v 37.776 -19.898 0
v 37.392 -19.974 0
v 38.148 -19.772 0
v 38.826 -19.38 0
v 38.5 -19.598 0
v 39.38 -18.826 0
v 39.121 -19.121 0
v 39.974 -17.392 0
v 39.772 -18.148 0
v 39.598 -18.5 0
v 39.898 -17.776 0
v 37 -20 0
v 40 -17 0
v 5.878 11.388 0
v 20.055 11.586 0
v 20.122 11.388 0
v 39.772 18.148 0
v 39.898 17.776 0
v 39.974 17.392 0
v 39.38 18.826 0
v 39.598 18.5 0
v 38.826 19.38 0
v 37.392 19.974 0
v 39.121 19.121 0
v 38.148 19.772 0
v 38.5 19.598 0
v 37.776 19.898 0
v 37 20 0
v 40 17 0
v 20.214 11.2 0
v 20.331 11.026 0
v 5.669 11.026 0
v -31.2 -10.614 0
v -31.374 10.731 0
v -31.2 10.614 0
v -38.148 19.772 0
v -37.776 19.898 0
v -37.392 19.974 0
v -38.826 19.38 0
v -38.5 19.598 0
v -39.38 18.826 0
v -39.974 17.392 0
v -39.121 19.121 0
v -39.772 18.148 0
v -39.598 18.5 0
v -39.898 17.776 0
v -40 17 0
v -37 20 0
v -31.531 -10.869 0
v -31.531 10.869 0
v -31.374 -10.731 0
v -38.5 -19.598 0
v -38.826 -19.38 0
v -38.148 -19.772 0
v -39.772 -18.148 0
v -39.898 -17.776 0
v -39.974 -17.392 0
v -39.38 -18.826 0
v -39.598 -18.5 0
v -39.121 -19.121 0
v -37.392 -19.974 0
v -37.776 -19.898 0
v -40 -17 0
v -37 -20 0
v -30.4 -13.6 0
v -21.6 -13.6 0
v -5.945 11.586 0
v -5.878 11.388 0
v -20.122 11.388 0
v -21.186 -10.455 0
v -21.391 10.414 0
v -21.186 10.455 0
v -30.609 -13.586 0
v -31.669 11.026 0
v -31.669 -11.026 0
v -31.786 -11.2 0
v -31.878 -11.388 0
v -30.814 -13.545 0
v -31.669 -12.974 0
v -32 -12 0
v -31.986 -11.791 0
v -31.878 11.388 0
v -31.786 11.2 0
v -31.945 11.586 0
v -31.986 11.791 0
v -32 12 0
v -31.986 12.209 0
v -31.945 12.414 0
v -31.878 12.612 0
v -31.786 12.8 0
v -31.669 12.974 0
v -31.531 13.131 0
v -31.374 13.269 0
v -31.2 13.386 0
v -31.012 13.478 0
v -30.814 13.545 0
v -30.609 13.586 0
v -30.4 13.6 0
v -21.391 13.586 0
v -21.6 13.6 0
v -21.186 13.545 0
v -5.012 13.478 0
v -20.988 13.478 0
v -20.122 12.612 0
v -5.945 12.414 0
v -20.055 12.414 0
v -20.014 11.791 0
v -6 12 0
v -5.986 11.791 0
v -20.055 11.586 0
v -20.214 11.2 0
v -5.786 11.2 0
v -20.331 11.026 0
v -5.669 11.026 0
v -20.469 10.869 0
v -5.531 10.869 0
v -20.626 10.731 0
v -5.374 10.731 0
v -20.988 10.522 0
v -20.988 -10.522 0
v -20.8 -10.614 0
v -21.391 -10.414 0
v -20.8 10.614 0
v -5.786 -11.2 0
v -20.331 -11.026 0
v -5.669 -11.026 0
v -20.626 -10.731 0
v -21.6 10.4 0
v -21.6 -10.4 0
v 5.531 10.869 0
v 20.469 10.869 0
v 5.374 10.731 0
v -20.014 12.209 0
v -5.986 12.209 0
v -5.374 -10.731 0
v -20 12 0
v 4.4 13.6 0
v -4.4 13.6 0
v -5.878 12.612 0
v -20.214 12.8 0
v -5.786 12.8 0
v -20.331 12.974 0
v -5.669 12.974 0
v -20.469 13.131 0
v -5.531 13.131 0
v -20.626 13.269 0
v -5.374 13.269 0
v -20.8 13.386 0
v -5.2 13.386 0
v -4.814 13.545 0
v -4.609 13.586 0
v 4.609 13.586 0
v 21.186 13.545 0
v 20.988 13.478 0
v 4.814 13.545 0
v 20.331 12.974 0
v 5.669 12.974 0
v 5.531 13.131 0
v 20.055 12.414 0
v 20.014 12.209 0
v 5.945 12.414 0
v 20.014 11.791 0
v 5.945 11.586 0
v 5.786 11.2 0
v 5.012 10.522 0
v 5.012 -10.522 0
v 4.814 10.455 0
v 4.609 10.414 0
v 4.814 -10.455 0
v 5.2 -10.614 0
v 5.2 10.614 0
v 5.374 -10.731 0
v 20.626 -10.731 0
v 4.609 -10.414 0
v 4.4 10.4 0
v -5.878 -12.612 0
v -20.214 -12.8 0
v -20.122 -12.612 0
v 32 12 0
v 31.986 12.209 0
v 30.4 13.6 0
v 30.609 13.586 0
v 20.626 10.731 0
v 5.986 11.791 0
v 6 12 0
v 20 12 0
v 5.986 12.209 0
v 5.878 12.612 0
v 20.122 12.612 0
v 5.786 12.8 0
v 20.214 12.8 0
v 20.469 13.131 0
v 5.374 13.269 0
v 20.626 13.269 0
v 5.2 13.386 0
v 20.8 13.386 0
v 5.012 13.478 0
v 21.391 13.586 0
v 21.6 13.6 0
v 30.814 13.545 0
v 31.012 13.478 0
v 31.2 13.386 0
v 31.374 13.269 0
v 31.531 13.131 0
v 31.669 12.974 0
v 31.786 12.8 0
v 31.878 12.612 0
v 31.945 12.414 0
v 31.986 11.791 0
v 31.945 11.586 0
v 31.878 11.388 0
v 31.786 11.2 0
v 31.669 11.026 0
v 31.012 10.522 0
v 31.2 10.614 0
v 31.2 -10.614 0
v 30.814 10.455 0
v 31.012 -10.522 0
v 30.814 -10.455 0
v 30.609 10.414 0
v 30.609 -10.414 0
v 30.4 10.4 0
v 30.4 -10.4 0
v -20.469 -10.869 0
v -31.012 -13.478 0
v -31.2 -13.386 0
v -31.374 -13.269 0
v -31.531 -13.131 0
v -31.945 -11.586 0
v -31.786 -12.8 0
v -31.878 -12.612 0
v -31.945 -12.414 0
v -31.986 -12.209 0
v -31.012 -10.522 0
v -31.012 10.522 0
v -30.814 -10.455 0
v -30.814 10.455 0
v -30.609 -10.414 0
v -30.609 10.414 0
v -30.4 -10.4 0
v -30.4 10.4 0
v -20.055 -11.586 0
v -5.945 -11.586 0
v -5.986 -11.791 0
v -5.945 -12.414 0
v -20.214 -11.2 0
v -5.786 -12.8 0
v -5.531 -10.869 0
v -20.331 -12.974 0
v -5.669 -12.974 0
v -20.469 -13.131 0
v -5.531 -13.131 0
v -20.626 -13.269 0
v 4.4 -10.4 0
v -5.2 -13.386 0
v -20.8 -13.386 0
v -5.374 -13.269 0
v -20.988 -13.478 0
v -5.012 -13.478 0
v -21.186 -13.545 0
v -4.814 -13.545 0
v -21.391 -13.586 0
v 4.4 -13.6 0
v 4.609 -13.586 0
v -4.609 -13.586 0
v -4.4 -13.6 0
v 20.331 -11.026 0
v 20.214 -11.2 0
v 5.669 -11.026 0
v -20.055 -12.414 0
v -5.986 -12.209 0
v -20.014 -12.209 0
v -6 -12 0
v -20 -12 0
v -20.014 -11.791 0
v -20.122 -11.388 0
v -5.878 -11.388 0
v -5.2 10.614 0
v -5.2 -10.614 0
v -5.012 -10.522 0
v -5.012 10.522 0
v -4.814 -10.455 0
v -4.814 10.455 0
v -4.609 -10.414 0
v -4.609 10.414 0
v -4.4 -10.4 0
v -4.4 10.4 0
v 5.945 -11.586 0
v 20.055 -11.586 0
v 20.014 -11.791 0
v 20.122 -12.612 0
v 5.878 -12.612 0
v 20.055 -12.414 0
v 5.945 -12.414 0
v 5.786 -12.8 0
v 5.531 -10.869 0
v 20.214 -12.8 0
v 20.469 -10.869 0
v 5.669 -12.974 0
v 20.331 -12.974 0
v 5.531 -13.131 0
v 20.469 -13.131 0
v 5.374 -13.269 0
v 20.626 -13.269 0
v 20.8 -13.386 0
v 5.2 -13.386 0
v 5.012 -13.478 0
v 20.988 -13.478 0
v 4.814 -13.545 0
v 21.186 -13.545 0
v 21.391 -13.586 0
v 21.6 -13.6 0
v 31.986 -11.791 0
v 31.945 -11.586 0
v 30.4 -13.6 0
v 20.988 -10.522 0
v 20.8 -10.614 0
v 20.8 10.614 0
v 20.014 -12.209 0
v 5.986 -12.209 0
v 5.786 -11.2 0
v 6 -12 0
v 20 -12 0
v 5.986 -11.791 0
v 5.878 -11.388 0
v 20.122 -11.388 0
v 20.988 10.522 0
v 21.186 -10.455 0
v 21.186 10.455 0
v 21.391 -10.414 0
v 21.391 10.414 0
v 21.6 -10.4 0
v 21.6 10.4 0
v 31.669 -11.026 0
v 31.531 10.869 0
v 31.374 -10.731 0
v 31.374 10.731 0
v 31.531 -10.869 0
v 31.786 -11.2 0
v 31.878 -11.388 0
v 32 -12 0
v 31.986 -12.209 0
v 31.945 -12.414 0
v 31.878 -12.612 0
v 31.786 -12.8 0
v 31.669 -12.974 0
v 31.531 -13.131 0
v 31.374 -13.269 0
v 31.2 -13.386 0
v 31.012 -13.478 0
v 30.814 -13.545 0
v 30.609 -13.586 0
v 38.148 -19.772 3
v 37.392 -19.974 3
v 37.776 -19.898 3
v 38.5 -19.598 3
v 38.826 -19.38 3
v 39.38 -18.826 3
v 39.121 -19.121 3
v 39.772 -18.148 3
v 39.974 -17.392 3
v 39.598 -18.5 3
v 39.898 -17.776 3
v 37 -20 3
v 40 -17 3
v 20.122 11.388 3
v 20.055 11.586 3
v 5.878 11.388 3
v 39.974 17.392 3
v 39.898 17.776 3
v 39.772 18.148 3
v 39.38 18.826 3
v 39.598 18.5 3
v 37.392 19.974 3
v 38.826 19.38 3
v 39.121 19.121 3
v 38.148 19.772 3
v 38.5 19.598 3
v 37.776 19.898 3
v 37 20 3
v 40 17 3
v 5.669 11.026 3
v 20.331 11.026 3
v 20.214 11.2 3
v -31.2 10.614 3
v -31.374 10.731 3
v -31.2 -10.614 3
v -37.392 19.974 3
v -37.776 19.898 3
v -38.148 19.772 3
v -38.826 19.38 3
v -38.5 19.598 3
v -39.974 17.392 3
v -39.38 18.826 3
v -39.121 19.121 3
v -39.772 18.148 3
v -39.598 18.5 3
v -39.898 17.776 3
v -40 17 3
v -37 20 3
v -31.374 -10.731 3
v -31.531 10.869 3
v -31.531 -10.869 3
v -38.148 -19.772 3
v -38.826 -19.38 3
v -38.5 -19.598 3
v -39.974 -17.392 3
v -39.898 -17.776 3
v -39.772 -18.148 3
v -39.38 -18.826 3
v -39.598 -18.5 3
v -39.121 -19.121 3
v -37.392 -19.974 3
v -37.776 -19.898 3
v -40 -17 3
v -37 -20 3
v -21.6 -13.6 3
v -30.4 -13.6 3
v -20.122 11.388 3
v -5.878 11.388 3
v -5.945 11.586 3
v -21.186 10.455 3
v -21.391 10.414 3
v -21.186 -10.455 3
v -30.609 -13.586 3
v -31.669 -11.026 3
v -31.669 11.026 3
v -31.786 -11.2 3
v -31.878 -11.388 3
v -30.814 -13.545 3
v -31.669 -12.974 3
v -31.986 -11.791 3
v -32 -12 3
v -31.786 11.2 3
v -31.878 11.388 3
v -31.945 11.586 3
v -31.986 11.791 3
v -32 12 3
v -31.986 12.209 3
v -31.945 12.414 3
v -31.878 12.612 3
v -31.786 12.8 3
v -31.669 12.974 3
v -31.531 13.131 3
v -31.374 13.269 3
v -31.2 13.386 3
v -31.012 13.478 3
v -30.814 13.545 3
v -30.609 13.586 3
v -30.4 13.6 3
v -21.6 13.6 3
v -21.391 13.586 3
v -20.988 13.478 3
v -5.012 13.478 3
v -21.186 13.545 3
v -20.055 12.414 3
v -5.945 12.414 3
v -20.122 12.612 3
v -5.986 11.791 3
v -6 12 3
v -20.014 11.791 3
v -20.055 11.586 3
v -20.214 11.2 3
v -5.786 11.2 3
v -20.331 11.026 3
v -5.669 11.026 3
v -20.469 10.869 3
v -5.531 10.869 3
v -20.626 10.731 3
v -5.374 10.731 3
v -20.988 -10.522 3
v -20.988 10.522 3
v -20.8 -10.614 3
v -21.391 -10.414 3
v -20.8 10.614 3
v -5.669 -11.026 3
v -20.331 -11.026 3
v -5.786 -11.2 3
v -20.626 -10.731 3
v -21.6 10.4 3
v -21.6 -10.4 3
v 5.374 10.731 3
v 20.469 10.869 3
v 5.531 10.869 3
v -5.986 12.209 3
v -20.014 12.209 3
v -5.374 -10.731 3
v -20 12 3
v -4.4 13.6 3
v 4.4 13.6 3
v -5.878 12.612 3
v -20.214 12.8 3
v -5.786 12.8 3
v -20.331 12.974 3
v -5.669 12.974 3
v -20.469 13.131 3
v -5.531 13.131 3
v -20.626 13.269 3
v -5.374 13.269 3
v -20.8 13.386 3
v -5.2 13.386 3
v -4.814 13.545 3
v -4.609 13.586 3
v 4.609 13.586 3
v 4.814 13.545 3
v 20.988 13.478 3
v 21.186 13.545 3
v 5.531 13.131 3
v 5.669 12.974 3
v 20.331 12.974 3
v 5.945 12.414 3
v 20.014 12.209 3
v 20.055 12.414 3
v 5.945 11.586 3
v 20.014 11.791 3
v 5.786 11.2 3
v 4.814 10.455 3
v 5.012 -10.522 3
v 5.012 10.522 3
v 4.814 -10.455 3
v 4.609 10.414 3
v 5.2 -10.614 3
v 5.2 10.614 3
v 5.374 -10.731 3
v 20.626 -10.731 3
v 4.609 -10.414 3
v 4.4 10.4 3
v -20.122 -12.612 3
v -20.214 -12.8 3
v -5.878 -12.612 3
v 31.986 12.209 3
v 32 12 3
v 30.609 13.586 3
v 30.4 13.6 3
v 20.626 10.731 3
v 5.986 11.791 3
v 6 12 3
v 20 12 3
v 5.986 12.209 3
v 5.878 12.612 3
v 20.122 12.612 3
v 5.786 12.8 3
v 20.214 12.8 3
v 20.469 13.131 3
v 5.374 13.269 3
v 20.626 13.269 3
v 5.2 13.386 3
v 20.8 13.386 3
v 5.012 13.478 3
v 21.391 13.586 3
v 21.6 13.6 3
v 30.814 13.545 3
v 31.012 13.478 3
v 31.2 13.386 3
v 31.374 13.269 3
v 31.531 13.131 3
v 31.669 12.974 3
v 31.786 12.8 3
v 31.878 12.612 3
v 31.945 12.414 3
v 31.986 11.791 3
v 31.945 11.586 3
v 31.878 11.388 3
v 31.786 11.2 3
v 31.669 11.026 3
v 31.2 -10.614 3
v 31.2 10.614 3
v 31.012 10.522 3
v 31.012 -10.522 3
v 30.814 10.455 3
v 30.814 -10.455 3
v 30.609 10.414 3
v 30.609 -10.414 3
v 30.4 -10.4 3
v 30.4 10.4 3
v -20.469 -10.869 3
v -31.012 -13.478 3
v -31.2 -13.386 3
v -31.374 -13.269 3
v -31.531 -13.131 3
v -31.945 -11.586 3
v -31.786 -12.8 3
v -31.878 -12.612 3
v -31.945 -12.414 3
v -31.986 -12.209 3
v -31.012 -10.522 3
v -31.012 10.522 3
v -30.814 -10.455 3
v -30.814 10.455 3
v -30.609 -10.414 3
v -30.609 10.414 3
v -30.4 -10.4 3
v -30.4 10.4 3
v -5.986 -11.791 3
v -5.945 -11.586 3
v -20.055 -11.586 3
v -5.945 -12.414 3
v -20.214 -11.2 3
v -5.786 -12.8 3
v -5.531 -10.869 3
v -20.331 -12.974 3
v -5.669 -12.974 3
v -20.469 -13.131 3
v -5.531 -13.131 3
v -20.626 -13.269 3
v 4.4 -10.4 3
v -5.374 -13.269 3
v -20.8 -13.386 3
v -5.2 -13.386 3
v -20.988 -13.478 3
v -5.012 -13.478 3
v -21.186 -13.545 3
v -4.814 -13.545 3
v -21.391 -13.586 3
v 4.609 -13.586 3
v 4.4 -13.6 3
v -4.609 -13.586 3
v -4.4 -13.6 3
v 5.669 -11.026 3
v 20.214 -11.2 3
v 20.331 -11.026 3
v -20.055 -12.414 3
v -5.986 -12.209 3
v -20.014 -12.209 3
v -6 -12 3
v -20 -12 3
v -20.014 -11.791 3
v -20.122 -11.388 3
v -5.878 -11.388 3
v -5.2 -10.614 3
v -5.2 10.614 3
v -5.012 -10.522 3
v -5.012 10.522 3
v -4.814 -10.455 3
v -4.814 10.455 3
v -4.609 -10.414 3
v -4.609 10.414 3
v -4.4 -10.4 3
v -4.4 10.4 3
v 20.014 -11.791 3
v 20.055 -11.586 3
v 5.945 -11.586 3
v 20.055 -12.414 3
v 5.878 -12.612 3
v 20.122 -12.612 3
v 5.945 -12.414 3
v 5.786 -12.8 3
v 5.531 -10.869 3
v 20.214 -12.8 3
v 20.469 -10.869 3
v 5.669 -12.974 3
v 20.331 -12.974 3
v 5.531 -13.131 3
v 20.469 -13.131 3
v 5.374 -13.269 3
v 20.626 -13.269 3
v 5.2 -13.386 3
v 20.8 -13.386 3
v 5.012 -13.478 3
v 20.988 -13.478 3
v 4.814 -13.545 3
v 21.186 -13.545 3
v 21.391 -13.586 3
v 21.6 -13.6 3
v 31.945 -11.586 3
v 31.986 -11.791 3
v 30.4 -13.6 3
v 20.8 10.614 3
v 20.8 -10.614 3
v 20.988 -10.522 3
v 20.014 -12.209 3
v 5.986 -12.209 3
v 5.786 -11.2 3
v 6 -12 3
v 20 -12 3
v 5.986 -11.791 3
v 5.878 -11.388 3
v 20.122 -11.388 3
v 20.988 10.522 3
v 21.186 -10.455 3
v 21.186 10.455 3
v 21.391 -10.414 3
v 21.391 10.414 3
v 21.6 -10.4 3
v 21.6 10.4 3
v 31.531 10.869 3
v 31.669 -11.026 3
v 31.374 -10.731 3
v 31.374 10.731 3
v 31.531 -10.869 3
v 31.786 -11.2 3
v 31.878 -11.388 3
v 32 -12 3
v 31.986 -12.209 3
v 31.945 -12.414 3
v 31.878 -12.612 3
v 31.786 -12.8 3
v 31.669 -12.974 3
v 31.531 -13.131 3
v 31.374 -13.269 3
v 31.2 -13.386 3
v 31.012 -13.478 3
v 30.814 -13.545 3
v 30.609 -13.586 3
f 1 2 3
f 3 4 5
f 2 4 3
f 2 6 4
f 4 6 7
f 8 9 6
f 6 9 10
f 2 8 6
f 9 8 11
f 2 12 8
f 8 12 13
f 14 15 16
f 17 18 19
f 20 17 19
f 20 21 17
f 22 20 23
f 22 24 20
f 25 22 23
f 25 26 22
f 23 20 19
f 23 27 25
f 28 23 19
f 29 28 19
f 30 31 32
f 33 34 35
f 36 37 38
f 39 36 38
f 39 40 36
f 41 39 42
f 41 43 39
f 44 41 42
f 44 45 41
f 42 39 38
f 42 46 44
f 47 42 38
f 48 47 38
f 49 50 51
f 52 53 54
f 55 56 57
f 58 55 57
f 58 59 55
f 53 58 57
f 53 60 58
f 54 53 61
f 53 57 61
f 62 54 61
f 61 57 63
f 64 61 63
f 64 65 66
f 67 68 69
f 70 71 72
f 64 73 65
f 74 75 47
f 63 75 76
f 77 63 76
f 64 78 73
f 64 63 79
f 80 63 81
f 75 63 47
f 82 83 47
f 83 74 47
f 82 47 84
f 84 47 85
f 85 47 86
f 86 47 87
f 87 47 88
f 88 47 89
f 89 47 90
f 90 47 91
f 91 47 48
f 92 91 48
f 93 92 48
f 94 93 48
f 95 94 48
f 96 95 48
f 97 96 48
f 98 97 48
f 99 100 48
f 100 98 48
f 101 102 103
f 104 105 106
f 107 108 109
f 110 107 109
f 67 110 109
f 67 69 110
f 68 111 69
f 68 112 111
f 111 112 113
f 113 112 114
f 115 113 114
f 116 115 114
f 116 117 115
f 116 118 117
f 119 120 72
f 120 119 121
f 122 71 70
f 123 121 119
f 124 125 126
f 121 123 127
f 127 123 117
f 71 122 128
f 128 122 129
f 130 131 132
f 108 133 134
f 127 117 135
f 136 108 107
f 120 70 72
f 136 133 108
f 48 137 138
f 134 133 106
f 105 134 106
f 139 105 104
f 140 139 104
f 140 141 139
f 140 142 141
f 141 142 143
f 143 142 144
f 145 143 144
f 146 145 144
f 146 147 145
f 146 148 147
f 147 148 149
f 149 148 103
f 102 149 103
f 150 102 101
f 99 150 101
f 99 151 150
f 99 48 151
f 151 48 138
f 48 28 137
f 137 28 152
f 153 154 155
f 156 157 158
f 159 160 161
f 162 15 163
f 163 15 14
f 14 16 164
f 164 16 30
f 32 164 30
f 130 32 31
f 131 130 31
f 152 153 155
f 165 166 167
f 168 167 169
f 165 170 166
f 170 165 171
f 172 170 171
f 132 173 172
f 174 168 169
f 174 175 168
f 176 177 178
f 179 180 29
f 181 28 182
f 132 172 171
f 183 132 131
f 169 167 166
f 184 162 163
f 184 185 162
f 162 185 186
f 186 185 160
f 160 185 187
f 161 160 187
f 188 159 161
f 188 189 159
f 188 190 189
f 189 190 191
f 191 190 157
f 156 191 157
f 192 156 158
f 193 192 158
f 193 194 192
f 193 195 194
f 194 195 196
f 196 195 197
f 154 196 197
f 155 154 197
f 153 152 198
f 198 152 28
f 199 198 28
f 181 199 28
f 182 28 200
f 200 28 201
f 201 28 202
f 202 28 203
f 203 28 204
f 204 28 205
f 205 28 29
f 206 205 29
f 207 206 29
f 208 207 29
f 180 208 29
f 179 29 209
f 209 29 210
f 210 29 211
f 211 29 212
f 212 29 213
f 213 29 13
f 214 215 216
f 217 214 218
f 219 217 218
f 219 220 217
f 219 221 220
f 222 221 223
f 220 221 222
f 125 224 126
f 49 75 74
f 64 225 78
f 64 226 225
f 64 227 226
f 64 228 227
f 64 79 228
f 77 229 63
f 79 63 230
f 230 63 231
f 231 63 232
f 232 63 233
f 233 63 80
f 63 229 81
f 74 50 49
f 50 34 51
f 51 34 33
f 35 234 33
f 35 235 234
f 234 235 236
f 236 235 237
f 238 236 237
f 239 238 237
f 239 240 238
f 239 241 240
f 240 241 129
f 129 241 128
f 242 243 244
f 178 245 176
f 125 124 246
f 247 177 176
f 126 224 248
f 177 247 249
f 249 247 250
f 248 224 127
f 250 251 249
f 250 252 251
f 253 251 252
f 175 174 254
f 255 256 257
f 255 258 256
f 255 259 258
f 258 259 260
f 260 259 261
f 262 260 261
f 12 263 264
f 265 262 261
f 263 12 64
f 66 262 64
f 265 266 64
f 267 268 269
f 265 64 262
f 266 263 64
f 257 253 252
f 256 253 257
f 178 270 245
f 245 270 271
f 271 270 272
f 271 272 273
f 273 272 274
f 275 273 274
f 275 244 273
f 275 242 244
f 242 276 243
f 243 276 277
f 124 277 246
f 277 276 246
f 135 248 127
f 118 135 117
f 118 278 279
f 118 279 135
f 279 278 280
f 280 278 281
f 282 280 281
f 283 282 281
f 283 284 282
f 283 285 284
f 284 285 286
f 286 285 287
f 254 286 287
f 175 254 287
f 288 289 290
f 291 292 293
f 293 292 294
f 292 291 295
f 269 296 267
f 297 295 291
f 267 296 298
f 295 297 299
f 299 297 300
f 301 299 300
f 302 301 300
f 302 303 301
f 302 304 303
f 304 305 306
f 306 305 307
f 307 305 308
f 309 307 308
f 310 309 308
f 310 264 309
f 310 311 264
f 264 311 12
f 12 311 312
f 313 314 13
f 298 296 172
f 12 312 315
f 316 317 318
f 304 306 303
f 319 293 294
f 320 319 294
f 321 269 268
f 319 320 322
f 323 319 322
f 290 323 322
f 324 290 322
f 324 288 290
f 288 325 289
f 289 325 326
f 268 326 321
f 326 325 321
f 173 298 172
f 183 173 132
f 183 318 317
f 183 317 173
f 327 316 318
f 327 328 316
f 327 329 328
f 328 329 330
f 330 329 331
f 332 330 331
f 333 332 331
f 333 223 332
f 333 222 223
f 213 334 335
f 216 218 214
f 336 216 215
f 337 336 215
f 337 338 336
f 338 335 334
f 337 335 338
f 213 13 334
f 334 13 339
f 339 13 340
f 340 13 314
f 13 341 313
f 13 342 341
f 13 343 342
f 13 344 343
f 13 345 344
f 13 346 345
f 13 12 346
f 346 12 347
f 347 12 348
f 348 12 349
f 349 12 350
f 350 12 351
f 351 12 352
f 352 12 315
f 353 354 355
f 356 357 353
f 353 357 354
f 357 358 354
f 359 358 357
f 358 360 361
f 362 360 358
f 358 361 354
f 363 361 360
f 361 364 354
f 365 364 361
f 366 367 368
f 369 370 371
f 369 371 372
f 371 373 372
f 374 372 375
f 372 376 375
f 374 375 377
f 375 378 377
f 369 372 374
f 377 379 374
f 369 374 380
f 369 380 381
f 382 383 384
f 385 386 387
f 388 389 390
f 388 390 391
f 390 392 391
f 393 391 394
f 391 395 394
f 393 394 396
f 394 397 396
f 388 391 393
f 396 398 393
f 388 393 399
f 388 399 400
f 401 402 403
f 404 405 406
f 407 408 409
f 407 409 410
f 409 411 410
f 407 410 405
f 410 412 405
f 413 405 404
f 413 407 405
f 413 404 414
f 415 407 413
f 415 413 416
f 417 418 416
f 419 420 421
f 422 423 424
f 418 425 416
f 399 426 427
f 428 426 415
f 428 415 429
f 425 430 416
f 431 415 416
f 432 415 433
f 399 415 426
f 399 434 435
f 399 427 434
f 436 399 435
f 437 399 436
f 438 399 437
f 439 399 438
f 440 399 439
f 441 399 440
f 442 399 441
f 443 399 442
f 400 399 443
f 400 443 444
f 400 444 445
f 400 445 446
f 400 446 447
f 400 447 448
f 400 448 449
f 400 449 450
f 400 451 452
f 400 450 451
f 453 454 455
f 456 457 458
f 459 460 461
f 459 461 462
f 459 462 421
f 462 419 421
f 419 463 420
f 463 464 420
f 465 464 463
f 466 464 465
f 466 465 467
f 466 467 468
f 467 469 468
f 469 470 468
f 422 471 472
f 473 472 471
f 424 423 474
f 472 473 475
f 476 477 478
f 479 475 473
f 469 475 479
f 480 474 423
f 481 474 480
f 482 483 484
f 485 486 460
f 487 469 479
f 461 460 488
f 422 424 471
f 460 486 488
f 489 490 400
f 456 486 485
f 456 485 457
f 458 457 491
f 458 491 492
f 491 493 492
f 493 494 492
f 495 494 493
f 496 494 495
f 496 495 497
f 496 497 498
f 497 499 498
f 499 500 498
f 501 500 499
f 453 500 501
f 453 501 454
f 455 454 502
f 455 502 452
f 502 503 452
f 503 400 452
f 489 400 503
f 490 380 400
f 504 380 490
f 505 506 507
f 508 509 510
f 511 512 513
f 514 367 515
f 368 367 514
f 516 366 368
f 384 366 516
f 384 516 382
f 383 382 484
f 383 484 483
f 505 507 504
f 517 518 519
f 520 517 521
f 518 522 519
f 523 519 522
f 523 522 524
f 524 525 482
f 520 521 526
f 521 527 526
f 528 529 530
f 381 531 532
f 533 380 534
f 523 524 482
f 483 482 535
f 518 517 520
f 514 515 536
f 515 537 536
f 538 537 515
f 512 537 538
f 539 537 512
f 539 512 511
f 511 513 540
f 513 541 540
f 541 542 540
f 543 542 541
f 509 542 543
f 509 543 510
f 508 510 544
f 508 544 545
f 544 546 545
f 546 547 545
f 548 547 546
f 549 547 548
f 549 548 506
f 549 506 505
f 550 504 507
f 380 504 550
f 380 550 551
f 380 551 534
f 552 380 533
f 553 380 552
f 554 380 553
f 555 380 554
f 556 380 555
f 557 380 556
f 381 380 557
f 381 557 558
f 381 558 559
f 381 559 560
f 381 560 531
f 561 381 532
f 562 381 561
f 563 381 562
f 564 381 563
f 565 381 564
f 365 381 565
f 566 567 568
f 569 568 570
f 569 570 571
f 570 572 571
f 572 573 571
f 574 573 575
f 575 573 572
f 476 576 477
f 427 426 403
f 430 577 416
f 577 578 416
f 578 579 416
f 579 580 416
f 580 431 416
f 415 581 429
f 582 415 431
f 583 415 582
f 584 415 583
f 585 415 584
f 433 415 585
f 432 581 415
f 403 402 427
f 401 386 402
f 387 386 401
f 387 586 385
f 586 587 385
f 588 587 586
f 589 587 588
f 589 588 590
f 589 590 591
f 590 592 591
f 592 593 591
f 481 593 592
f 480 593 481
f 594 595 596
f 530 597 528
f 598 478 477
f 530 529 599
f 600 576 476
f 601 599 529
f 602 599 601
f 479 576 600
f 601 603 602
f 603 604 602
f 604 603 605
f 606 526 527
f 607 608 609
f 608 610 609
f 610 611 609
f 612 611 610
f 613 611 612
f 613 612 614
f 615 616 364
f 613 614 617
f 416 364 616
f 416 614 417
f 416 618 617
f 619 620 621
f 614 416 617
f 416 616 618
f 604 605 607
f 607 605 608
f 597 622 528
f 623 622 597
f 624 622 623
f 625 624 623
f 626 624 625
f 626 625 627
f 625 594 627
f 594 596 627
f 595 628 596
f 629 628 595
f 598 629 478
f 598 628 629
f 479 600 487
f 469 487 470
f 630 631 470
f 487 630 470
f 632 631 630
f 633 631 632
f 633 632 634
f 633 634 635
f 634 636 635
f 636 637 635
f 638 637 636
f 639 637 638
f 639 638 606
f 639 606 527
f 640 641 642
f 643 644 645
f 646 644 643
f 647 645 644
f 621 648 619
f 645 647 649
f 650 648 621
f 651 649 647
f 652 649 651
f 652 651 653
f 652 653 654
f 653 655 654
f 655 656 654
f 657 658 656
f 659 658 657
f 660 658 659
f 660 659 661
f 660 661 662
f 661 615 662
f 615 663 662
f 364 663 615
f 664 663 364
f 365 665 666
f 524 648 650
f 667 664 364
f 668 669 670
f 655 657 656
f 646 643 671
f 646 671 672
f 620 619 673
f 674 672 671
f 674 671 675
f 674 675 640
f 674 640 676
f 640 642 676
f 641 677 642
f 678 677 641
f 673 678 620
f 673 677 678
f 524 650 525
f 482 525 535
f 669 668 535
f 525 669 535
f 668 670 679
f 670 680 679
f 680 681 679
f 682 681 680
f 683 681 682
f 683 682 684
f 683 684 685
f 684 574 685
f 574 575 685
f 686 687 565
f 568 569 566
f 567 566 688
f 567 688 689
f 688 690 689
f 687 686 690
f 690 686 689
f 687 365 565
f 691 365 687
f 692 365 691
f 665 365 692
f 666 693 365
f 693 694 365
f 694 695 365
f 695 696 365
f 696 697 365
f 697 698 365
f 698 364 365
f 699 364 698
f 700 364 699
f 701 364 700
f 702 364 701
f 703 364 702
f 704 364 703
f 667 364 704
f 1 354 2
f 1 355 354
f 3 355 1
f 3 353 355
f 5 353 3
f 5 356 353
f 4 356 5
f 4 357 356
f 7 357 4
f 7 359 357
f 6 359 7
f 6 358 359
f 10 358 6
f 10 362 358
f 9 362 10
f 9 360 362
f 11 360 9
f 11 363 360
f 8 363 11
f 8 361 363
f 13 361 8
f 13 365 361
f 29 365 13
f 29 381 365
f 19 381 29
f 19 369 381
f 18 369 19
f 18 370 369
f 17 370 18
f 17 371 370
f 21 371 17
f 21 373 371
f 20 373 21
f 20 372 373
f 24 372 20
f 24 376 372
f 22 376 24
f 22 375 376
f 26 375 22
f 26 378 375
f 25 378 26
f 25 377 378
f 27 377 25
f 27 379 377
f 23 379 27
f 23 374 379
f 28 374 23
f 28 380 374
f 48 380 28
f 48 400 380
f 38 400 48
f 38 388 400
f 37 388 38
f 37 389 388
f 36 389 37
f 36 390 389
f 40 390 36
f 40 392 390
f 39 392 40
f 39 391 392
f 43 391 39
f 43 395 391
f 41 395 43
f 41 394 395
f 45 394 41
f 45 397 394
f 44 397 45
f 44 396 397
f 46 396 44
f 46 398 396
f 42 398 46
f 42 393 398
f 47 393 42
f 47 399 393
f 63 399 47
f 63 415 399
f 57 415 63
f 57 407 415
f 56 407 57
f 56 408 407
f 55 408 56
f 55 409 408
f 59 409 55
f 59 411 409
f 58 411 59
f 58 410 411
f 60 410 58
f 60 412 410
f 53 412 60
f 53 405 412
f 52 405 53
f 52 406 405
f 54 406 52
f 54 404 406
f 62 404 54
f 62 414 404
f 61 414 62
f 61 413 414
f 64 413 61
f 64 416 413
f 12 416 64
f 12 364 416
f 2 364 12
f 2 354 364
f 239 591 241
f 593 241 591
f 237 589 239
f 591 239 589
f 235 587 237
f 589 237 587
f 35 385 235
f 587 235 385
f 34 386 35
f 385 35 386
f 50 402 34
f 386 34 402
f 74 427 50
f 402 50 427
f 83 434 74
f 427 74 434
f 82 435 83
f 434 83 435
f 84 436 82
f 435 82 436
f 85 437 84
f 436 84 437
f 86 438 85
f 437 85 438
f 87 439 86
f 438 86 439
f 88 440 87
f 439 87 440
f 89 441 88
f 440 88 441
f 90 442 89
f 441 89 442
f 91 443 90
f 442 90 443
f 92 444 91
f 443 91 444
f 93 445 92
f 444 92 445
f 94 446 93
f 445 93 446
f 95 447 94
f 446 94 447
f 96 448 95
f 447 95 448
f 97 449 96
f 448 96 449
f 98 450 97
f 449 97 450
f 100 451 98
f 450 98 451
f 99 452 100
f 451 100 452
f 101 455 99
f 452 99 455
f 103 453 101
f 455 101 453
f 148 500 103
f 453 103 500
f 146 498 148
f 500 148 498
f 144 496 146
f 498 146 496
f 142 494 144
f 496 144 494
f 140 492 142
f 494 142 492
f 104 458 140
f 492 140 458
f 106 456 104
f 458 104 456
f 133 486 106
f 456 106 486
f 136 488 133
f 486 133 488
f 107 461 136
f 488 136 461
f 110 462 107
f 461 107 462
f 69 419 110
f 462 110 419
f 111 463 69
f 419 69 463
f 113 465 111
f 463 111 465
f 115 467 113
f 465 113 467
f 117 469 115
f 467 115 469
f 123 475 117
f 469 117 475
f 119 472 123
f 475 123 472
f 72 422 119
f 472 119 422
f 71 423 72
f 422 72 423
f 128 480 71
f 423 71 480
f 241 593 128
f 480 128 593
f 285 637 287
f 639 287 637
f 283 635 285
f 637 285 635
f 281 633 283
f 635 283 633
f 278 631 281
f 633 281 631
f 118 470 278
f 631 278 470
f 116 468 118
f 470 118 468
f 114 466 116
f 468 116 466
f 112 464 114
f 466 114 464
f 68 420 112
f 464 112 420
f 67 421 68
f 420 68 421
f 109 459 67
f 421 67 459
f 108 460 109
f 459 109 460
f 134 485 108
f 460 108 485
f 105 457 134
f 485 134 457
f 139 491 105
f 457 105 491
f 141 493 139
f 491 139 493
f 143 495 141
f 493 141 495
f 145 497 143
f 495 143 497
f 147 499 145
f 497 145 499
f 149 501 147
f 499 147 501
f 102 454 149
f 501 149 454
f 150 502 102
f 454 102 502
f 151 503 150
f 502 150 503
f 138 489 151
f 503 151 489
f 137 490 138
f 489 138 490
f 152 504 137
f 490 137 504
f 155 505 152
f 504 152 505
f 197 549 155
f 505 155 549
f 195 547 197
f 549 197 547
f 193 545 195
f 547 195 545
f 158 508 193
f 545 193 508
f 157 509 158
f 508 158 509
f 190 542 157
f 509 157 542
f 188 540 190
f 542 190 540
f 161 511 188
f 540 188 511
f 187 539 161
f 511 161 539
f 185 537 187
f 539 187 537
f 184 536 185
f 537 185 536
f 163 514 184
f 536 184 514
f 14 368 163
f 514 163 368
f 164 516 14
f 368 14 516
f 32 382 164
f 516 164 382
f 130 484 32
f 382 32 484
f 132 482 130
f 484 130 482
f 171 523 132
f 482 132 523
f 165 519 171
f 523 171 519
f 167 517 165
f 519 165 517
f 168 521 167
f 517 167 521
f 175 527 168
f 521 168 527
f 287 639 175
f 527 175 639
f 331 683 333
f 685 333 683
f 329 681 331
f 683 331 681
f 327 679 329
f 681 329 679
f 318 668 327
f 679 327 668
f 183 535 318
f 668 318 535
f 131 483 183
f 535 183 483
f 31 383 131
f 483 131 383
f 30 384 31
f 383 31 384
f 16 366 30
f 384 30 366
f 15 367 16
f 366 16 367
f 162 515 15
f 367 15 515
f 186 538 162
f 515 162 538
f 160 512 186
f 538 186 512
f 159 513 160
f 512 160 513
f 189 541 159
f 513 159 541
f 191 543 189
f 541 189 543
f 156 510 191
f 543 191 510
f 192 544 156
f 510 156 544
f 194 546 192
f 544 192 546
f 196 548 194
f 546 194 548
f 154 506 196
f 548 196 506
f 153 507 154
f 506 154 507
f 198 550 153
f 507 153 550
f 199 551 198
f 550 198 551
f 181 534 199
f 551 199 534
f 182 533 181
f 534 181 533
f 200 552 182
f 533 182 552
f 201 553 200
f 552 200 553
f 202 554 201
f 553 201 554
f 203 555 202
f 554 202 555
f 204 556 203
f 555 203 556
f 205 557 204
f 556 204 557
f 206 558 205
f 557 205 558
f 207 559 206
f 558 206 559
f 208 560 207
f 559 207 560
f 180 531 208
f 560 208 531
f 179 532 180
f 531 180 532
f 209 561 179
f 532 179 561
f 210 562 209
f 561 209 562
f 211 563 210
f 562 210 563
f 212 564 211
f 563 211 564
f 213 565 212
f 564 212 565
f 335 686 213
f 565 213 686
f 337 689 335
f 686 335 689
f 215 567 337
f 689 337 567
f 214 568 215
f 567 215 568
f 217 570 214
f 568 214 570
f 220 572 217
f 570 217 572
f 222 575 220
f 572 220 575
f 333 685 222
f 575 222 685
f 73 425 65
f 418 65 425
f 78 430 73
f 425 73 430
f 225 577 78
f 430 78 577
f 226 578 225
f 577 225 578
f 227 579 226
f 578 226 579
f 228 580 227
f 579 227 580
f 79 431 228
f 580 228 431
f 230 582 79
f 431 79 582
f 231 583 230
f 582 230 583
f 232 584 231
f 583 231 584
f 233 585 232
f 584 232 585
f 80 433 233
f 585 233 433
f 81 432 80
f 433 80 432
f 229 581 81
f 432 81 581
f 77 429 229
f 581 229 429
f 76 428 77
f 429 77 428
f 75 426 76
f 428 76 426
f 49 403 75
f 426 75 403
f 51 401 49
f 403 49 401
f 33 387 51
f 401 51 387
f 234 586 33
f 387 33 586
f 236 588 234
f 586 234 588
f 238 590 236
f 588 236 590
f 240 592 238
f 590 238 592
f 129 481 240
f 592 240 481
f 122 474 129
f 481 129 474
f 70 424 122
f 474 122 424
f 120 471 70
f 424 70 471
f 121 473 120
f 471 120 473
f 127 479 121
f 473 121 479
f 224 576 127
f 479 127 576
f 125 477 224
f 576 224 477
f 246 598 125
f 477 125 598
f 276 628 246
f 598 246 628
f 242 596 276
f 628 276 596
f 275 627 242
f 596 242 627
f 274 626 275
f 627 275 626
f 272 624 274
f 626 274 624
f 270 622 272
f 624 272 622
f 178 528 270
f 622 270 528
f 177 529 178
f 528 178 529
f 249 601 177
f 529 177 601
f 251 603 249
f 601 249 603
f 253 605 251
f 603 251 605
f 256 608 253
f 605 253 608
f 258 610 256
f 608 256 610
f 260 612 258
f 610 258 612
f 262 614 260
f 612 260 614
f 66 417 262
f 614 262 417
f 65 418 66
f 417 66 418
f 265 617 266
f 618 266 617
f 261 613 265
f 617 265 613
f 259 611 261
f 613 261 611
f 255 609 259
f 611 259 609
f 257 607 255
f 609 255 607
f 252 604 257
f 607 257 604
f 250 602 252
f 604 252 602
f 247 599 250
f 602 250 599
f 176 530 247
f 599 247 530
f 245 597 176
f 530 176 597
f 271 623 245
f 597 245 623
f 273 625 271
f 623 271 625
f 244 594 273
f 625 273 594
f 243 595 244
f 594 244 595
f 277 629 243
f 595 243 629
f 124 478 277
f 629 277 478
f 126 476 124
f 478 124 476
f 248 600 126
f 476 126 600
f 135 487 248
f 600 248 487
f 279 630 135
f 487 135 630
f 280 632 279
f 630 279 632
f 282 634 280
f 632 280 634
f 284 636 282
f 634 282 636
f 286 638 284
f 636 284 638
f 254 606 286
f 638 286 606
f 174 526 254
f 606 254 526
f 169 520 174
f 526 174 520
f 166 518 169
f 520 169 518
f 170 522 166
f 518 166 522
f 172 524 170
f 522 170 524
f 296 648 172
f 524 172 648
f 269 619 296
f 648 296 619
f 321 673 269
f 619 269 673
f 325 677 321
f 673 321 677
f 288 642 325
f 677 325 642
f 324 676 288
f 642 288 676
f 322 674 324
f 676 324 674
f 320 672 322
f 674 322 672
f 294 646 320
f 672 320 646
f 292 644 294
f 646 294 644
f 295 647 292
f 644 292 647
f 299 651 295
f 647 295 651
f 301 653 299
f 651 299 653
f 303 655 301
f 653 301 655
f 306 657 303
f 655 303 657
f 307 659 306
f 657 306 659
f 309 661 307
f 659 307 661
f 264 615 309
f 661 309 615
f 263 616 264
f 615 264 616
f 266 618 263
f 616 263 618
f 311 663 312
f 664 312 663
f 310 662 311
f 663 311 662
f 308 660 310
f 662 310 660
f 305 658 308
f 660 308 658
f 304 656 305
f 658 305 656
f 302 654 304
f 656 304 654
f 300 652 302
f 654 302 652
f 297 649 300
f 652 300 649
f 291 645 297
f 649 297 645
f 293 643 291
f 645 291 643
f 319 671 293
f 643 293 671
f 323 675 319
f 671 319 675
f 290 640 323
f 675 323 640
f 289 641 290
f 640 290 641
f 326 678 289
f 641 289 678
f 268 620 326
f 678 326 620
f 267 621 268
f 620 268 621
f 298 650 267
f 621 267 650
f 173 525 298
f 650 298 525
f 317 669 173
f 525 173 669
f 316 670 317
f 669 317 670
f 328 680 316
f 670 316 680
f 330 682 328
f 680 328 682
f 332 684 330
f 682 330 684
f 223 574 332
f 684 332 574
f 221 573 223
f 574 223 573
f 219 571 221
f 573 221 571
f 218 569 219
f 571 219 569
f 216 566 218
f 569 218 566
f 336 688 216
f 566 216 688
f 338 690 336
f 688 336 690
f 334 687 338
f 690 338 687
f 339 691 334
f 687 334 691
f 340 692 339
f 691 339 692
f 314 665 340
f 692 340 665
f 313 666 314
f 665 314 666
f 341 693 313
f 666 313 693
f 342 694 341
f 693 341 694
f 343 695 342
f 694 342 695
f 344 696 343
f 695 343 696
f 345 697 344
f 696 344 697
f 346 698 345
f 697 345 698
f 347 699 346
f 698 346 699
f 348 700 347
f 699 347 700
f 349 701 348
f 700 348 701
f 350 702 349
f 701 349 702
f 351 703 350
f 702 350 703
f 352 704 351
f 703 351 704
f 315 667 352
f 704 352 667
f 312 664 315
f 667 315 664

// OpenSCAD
// ODIN provisional adjustable fixture base. Units: mm.
// Camera-specific carriers, PCB hole patterns and tripod interface are pending measurements.
// This is not a fit-validated complete camera mount.
plate_width = 80;
plate_depth = 40;
plate_thickness = 3;
corner_radius = 3;
slot_length = 12;   // overall capsule length
slot_width = 3.2;
slot_x = plate_width / 2 - 14;
slot_y = plate_depth / 2 - 8;
$fn = 48;

assert(plate_thickness > 0);
assert(corner_radius > 0 && 2 * corner_radius < min(plate_width, plate_depth));
assert(slot_length > slot_width && slot_width > 0);
assert(slot_x > slot_length && slot_y > slot_width);
assert(slot_x + slot_length / 2 < plate_width / 2 - corner_radius);
assert(slot_y + slot_width / 2 < plate_depth / 2 - corner_radius);

module capsule(length, width) {
    hull() {
        translate([-(length-width)/2, 0]) circle(d=width);
        translate([(length-width)/2, 0]) circle(d=width);
    }
}

linear_extrude(height=plate_thickness)
difference() {
    offset(r=corner_radius)
        square([plate_width - 2*corner_radius, plate_depth - 2*corner_radius], center=true);
    for (x = [-slot_x, 0, slot_x])
        for (y = [-slot_y, slot_y])
            translate([x, y]) capsule(slot_length, slot_width);
}
